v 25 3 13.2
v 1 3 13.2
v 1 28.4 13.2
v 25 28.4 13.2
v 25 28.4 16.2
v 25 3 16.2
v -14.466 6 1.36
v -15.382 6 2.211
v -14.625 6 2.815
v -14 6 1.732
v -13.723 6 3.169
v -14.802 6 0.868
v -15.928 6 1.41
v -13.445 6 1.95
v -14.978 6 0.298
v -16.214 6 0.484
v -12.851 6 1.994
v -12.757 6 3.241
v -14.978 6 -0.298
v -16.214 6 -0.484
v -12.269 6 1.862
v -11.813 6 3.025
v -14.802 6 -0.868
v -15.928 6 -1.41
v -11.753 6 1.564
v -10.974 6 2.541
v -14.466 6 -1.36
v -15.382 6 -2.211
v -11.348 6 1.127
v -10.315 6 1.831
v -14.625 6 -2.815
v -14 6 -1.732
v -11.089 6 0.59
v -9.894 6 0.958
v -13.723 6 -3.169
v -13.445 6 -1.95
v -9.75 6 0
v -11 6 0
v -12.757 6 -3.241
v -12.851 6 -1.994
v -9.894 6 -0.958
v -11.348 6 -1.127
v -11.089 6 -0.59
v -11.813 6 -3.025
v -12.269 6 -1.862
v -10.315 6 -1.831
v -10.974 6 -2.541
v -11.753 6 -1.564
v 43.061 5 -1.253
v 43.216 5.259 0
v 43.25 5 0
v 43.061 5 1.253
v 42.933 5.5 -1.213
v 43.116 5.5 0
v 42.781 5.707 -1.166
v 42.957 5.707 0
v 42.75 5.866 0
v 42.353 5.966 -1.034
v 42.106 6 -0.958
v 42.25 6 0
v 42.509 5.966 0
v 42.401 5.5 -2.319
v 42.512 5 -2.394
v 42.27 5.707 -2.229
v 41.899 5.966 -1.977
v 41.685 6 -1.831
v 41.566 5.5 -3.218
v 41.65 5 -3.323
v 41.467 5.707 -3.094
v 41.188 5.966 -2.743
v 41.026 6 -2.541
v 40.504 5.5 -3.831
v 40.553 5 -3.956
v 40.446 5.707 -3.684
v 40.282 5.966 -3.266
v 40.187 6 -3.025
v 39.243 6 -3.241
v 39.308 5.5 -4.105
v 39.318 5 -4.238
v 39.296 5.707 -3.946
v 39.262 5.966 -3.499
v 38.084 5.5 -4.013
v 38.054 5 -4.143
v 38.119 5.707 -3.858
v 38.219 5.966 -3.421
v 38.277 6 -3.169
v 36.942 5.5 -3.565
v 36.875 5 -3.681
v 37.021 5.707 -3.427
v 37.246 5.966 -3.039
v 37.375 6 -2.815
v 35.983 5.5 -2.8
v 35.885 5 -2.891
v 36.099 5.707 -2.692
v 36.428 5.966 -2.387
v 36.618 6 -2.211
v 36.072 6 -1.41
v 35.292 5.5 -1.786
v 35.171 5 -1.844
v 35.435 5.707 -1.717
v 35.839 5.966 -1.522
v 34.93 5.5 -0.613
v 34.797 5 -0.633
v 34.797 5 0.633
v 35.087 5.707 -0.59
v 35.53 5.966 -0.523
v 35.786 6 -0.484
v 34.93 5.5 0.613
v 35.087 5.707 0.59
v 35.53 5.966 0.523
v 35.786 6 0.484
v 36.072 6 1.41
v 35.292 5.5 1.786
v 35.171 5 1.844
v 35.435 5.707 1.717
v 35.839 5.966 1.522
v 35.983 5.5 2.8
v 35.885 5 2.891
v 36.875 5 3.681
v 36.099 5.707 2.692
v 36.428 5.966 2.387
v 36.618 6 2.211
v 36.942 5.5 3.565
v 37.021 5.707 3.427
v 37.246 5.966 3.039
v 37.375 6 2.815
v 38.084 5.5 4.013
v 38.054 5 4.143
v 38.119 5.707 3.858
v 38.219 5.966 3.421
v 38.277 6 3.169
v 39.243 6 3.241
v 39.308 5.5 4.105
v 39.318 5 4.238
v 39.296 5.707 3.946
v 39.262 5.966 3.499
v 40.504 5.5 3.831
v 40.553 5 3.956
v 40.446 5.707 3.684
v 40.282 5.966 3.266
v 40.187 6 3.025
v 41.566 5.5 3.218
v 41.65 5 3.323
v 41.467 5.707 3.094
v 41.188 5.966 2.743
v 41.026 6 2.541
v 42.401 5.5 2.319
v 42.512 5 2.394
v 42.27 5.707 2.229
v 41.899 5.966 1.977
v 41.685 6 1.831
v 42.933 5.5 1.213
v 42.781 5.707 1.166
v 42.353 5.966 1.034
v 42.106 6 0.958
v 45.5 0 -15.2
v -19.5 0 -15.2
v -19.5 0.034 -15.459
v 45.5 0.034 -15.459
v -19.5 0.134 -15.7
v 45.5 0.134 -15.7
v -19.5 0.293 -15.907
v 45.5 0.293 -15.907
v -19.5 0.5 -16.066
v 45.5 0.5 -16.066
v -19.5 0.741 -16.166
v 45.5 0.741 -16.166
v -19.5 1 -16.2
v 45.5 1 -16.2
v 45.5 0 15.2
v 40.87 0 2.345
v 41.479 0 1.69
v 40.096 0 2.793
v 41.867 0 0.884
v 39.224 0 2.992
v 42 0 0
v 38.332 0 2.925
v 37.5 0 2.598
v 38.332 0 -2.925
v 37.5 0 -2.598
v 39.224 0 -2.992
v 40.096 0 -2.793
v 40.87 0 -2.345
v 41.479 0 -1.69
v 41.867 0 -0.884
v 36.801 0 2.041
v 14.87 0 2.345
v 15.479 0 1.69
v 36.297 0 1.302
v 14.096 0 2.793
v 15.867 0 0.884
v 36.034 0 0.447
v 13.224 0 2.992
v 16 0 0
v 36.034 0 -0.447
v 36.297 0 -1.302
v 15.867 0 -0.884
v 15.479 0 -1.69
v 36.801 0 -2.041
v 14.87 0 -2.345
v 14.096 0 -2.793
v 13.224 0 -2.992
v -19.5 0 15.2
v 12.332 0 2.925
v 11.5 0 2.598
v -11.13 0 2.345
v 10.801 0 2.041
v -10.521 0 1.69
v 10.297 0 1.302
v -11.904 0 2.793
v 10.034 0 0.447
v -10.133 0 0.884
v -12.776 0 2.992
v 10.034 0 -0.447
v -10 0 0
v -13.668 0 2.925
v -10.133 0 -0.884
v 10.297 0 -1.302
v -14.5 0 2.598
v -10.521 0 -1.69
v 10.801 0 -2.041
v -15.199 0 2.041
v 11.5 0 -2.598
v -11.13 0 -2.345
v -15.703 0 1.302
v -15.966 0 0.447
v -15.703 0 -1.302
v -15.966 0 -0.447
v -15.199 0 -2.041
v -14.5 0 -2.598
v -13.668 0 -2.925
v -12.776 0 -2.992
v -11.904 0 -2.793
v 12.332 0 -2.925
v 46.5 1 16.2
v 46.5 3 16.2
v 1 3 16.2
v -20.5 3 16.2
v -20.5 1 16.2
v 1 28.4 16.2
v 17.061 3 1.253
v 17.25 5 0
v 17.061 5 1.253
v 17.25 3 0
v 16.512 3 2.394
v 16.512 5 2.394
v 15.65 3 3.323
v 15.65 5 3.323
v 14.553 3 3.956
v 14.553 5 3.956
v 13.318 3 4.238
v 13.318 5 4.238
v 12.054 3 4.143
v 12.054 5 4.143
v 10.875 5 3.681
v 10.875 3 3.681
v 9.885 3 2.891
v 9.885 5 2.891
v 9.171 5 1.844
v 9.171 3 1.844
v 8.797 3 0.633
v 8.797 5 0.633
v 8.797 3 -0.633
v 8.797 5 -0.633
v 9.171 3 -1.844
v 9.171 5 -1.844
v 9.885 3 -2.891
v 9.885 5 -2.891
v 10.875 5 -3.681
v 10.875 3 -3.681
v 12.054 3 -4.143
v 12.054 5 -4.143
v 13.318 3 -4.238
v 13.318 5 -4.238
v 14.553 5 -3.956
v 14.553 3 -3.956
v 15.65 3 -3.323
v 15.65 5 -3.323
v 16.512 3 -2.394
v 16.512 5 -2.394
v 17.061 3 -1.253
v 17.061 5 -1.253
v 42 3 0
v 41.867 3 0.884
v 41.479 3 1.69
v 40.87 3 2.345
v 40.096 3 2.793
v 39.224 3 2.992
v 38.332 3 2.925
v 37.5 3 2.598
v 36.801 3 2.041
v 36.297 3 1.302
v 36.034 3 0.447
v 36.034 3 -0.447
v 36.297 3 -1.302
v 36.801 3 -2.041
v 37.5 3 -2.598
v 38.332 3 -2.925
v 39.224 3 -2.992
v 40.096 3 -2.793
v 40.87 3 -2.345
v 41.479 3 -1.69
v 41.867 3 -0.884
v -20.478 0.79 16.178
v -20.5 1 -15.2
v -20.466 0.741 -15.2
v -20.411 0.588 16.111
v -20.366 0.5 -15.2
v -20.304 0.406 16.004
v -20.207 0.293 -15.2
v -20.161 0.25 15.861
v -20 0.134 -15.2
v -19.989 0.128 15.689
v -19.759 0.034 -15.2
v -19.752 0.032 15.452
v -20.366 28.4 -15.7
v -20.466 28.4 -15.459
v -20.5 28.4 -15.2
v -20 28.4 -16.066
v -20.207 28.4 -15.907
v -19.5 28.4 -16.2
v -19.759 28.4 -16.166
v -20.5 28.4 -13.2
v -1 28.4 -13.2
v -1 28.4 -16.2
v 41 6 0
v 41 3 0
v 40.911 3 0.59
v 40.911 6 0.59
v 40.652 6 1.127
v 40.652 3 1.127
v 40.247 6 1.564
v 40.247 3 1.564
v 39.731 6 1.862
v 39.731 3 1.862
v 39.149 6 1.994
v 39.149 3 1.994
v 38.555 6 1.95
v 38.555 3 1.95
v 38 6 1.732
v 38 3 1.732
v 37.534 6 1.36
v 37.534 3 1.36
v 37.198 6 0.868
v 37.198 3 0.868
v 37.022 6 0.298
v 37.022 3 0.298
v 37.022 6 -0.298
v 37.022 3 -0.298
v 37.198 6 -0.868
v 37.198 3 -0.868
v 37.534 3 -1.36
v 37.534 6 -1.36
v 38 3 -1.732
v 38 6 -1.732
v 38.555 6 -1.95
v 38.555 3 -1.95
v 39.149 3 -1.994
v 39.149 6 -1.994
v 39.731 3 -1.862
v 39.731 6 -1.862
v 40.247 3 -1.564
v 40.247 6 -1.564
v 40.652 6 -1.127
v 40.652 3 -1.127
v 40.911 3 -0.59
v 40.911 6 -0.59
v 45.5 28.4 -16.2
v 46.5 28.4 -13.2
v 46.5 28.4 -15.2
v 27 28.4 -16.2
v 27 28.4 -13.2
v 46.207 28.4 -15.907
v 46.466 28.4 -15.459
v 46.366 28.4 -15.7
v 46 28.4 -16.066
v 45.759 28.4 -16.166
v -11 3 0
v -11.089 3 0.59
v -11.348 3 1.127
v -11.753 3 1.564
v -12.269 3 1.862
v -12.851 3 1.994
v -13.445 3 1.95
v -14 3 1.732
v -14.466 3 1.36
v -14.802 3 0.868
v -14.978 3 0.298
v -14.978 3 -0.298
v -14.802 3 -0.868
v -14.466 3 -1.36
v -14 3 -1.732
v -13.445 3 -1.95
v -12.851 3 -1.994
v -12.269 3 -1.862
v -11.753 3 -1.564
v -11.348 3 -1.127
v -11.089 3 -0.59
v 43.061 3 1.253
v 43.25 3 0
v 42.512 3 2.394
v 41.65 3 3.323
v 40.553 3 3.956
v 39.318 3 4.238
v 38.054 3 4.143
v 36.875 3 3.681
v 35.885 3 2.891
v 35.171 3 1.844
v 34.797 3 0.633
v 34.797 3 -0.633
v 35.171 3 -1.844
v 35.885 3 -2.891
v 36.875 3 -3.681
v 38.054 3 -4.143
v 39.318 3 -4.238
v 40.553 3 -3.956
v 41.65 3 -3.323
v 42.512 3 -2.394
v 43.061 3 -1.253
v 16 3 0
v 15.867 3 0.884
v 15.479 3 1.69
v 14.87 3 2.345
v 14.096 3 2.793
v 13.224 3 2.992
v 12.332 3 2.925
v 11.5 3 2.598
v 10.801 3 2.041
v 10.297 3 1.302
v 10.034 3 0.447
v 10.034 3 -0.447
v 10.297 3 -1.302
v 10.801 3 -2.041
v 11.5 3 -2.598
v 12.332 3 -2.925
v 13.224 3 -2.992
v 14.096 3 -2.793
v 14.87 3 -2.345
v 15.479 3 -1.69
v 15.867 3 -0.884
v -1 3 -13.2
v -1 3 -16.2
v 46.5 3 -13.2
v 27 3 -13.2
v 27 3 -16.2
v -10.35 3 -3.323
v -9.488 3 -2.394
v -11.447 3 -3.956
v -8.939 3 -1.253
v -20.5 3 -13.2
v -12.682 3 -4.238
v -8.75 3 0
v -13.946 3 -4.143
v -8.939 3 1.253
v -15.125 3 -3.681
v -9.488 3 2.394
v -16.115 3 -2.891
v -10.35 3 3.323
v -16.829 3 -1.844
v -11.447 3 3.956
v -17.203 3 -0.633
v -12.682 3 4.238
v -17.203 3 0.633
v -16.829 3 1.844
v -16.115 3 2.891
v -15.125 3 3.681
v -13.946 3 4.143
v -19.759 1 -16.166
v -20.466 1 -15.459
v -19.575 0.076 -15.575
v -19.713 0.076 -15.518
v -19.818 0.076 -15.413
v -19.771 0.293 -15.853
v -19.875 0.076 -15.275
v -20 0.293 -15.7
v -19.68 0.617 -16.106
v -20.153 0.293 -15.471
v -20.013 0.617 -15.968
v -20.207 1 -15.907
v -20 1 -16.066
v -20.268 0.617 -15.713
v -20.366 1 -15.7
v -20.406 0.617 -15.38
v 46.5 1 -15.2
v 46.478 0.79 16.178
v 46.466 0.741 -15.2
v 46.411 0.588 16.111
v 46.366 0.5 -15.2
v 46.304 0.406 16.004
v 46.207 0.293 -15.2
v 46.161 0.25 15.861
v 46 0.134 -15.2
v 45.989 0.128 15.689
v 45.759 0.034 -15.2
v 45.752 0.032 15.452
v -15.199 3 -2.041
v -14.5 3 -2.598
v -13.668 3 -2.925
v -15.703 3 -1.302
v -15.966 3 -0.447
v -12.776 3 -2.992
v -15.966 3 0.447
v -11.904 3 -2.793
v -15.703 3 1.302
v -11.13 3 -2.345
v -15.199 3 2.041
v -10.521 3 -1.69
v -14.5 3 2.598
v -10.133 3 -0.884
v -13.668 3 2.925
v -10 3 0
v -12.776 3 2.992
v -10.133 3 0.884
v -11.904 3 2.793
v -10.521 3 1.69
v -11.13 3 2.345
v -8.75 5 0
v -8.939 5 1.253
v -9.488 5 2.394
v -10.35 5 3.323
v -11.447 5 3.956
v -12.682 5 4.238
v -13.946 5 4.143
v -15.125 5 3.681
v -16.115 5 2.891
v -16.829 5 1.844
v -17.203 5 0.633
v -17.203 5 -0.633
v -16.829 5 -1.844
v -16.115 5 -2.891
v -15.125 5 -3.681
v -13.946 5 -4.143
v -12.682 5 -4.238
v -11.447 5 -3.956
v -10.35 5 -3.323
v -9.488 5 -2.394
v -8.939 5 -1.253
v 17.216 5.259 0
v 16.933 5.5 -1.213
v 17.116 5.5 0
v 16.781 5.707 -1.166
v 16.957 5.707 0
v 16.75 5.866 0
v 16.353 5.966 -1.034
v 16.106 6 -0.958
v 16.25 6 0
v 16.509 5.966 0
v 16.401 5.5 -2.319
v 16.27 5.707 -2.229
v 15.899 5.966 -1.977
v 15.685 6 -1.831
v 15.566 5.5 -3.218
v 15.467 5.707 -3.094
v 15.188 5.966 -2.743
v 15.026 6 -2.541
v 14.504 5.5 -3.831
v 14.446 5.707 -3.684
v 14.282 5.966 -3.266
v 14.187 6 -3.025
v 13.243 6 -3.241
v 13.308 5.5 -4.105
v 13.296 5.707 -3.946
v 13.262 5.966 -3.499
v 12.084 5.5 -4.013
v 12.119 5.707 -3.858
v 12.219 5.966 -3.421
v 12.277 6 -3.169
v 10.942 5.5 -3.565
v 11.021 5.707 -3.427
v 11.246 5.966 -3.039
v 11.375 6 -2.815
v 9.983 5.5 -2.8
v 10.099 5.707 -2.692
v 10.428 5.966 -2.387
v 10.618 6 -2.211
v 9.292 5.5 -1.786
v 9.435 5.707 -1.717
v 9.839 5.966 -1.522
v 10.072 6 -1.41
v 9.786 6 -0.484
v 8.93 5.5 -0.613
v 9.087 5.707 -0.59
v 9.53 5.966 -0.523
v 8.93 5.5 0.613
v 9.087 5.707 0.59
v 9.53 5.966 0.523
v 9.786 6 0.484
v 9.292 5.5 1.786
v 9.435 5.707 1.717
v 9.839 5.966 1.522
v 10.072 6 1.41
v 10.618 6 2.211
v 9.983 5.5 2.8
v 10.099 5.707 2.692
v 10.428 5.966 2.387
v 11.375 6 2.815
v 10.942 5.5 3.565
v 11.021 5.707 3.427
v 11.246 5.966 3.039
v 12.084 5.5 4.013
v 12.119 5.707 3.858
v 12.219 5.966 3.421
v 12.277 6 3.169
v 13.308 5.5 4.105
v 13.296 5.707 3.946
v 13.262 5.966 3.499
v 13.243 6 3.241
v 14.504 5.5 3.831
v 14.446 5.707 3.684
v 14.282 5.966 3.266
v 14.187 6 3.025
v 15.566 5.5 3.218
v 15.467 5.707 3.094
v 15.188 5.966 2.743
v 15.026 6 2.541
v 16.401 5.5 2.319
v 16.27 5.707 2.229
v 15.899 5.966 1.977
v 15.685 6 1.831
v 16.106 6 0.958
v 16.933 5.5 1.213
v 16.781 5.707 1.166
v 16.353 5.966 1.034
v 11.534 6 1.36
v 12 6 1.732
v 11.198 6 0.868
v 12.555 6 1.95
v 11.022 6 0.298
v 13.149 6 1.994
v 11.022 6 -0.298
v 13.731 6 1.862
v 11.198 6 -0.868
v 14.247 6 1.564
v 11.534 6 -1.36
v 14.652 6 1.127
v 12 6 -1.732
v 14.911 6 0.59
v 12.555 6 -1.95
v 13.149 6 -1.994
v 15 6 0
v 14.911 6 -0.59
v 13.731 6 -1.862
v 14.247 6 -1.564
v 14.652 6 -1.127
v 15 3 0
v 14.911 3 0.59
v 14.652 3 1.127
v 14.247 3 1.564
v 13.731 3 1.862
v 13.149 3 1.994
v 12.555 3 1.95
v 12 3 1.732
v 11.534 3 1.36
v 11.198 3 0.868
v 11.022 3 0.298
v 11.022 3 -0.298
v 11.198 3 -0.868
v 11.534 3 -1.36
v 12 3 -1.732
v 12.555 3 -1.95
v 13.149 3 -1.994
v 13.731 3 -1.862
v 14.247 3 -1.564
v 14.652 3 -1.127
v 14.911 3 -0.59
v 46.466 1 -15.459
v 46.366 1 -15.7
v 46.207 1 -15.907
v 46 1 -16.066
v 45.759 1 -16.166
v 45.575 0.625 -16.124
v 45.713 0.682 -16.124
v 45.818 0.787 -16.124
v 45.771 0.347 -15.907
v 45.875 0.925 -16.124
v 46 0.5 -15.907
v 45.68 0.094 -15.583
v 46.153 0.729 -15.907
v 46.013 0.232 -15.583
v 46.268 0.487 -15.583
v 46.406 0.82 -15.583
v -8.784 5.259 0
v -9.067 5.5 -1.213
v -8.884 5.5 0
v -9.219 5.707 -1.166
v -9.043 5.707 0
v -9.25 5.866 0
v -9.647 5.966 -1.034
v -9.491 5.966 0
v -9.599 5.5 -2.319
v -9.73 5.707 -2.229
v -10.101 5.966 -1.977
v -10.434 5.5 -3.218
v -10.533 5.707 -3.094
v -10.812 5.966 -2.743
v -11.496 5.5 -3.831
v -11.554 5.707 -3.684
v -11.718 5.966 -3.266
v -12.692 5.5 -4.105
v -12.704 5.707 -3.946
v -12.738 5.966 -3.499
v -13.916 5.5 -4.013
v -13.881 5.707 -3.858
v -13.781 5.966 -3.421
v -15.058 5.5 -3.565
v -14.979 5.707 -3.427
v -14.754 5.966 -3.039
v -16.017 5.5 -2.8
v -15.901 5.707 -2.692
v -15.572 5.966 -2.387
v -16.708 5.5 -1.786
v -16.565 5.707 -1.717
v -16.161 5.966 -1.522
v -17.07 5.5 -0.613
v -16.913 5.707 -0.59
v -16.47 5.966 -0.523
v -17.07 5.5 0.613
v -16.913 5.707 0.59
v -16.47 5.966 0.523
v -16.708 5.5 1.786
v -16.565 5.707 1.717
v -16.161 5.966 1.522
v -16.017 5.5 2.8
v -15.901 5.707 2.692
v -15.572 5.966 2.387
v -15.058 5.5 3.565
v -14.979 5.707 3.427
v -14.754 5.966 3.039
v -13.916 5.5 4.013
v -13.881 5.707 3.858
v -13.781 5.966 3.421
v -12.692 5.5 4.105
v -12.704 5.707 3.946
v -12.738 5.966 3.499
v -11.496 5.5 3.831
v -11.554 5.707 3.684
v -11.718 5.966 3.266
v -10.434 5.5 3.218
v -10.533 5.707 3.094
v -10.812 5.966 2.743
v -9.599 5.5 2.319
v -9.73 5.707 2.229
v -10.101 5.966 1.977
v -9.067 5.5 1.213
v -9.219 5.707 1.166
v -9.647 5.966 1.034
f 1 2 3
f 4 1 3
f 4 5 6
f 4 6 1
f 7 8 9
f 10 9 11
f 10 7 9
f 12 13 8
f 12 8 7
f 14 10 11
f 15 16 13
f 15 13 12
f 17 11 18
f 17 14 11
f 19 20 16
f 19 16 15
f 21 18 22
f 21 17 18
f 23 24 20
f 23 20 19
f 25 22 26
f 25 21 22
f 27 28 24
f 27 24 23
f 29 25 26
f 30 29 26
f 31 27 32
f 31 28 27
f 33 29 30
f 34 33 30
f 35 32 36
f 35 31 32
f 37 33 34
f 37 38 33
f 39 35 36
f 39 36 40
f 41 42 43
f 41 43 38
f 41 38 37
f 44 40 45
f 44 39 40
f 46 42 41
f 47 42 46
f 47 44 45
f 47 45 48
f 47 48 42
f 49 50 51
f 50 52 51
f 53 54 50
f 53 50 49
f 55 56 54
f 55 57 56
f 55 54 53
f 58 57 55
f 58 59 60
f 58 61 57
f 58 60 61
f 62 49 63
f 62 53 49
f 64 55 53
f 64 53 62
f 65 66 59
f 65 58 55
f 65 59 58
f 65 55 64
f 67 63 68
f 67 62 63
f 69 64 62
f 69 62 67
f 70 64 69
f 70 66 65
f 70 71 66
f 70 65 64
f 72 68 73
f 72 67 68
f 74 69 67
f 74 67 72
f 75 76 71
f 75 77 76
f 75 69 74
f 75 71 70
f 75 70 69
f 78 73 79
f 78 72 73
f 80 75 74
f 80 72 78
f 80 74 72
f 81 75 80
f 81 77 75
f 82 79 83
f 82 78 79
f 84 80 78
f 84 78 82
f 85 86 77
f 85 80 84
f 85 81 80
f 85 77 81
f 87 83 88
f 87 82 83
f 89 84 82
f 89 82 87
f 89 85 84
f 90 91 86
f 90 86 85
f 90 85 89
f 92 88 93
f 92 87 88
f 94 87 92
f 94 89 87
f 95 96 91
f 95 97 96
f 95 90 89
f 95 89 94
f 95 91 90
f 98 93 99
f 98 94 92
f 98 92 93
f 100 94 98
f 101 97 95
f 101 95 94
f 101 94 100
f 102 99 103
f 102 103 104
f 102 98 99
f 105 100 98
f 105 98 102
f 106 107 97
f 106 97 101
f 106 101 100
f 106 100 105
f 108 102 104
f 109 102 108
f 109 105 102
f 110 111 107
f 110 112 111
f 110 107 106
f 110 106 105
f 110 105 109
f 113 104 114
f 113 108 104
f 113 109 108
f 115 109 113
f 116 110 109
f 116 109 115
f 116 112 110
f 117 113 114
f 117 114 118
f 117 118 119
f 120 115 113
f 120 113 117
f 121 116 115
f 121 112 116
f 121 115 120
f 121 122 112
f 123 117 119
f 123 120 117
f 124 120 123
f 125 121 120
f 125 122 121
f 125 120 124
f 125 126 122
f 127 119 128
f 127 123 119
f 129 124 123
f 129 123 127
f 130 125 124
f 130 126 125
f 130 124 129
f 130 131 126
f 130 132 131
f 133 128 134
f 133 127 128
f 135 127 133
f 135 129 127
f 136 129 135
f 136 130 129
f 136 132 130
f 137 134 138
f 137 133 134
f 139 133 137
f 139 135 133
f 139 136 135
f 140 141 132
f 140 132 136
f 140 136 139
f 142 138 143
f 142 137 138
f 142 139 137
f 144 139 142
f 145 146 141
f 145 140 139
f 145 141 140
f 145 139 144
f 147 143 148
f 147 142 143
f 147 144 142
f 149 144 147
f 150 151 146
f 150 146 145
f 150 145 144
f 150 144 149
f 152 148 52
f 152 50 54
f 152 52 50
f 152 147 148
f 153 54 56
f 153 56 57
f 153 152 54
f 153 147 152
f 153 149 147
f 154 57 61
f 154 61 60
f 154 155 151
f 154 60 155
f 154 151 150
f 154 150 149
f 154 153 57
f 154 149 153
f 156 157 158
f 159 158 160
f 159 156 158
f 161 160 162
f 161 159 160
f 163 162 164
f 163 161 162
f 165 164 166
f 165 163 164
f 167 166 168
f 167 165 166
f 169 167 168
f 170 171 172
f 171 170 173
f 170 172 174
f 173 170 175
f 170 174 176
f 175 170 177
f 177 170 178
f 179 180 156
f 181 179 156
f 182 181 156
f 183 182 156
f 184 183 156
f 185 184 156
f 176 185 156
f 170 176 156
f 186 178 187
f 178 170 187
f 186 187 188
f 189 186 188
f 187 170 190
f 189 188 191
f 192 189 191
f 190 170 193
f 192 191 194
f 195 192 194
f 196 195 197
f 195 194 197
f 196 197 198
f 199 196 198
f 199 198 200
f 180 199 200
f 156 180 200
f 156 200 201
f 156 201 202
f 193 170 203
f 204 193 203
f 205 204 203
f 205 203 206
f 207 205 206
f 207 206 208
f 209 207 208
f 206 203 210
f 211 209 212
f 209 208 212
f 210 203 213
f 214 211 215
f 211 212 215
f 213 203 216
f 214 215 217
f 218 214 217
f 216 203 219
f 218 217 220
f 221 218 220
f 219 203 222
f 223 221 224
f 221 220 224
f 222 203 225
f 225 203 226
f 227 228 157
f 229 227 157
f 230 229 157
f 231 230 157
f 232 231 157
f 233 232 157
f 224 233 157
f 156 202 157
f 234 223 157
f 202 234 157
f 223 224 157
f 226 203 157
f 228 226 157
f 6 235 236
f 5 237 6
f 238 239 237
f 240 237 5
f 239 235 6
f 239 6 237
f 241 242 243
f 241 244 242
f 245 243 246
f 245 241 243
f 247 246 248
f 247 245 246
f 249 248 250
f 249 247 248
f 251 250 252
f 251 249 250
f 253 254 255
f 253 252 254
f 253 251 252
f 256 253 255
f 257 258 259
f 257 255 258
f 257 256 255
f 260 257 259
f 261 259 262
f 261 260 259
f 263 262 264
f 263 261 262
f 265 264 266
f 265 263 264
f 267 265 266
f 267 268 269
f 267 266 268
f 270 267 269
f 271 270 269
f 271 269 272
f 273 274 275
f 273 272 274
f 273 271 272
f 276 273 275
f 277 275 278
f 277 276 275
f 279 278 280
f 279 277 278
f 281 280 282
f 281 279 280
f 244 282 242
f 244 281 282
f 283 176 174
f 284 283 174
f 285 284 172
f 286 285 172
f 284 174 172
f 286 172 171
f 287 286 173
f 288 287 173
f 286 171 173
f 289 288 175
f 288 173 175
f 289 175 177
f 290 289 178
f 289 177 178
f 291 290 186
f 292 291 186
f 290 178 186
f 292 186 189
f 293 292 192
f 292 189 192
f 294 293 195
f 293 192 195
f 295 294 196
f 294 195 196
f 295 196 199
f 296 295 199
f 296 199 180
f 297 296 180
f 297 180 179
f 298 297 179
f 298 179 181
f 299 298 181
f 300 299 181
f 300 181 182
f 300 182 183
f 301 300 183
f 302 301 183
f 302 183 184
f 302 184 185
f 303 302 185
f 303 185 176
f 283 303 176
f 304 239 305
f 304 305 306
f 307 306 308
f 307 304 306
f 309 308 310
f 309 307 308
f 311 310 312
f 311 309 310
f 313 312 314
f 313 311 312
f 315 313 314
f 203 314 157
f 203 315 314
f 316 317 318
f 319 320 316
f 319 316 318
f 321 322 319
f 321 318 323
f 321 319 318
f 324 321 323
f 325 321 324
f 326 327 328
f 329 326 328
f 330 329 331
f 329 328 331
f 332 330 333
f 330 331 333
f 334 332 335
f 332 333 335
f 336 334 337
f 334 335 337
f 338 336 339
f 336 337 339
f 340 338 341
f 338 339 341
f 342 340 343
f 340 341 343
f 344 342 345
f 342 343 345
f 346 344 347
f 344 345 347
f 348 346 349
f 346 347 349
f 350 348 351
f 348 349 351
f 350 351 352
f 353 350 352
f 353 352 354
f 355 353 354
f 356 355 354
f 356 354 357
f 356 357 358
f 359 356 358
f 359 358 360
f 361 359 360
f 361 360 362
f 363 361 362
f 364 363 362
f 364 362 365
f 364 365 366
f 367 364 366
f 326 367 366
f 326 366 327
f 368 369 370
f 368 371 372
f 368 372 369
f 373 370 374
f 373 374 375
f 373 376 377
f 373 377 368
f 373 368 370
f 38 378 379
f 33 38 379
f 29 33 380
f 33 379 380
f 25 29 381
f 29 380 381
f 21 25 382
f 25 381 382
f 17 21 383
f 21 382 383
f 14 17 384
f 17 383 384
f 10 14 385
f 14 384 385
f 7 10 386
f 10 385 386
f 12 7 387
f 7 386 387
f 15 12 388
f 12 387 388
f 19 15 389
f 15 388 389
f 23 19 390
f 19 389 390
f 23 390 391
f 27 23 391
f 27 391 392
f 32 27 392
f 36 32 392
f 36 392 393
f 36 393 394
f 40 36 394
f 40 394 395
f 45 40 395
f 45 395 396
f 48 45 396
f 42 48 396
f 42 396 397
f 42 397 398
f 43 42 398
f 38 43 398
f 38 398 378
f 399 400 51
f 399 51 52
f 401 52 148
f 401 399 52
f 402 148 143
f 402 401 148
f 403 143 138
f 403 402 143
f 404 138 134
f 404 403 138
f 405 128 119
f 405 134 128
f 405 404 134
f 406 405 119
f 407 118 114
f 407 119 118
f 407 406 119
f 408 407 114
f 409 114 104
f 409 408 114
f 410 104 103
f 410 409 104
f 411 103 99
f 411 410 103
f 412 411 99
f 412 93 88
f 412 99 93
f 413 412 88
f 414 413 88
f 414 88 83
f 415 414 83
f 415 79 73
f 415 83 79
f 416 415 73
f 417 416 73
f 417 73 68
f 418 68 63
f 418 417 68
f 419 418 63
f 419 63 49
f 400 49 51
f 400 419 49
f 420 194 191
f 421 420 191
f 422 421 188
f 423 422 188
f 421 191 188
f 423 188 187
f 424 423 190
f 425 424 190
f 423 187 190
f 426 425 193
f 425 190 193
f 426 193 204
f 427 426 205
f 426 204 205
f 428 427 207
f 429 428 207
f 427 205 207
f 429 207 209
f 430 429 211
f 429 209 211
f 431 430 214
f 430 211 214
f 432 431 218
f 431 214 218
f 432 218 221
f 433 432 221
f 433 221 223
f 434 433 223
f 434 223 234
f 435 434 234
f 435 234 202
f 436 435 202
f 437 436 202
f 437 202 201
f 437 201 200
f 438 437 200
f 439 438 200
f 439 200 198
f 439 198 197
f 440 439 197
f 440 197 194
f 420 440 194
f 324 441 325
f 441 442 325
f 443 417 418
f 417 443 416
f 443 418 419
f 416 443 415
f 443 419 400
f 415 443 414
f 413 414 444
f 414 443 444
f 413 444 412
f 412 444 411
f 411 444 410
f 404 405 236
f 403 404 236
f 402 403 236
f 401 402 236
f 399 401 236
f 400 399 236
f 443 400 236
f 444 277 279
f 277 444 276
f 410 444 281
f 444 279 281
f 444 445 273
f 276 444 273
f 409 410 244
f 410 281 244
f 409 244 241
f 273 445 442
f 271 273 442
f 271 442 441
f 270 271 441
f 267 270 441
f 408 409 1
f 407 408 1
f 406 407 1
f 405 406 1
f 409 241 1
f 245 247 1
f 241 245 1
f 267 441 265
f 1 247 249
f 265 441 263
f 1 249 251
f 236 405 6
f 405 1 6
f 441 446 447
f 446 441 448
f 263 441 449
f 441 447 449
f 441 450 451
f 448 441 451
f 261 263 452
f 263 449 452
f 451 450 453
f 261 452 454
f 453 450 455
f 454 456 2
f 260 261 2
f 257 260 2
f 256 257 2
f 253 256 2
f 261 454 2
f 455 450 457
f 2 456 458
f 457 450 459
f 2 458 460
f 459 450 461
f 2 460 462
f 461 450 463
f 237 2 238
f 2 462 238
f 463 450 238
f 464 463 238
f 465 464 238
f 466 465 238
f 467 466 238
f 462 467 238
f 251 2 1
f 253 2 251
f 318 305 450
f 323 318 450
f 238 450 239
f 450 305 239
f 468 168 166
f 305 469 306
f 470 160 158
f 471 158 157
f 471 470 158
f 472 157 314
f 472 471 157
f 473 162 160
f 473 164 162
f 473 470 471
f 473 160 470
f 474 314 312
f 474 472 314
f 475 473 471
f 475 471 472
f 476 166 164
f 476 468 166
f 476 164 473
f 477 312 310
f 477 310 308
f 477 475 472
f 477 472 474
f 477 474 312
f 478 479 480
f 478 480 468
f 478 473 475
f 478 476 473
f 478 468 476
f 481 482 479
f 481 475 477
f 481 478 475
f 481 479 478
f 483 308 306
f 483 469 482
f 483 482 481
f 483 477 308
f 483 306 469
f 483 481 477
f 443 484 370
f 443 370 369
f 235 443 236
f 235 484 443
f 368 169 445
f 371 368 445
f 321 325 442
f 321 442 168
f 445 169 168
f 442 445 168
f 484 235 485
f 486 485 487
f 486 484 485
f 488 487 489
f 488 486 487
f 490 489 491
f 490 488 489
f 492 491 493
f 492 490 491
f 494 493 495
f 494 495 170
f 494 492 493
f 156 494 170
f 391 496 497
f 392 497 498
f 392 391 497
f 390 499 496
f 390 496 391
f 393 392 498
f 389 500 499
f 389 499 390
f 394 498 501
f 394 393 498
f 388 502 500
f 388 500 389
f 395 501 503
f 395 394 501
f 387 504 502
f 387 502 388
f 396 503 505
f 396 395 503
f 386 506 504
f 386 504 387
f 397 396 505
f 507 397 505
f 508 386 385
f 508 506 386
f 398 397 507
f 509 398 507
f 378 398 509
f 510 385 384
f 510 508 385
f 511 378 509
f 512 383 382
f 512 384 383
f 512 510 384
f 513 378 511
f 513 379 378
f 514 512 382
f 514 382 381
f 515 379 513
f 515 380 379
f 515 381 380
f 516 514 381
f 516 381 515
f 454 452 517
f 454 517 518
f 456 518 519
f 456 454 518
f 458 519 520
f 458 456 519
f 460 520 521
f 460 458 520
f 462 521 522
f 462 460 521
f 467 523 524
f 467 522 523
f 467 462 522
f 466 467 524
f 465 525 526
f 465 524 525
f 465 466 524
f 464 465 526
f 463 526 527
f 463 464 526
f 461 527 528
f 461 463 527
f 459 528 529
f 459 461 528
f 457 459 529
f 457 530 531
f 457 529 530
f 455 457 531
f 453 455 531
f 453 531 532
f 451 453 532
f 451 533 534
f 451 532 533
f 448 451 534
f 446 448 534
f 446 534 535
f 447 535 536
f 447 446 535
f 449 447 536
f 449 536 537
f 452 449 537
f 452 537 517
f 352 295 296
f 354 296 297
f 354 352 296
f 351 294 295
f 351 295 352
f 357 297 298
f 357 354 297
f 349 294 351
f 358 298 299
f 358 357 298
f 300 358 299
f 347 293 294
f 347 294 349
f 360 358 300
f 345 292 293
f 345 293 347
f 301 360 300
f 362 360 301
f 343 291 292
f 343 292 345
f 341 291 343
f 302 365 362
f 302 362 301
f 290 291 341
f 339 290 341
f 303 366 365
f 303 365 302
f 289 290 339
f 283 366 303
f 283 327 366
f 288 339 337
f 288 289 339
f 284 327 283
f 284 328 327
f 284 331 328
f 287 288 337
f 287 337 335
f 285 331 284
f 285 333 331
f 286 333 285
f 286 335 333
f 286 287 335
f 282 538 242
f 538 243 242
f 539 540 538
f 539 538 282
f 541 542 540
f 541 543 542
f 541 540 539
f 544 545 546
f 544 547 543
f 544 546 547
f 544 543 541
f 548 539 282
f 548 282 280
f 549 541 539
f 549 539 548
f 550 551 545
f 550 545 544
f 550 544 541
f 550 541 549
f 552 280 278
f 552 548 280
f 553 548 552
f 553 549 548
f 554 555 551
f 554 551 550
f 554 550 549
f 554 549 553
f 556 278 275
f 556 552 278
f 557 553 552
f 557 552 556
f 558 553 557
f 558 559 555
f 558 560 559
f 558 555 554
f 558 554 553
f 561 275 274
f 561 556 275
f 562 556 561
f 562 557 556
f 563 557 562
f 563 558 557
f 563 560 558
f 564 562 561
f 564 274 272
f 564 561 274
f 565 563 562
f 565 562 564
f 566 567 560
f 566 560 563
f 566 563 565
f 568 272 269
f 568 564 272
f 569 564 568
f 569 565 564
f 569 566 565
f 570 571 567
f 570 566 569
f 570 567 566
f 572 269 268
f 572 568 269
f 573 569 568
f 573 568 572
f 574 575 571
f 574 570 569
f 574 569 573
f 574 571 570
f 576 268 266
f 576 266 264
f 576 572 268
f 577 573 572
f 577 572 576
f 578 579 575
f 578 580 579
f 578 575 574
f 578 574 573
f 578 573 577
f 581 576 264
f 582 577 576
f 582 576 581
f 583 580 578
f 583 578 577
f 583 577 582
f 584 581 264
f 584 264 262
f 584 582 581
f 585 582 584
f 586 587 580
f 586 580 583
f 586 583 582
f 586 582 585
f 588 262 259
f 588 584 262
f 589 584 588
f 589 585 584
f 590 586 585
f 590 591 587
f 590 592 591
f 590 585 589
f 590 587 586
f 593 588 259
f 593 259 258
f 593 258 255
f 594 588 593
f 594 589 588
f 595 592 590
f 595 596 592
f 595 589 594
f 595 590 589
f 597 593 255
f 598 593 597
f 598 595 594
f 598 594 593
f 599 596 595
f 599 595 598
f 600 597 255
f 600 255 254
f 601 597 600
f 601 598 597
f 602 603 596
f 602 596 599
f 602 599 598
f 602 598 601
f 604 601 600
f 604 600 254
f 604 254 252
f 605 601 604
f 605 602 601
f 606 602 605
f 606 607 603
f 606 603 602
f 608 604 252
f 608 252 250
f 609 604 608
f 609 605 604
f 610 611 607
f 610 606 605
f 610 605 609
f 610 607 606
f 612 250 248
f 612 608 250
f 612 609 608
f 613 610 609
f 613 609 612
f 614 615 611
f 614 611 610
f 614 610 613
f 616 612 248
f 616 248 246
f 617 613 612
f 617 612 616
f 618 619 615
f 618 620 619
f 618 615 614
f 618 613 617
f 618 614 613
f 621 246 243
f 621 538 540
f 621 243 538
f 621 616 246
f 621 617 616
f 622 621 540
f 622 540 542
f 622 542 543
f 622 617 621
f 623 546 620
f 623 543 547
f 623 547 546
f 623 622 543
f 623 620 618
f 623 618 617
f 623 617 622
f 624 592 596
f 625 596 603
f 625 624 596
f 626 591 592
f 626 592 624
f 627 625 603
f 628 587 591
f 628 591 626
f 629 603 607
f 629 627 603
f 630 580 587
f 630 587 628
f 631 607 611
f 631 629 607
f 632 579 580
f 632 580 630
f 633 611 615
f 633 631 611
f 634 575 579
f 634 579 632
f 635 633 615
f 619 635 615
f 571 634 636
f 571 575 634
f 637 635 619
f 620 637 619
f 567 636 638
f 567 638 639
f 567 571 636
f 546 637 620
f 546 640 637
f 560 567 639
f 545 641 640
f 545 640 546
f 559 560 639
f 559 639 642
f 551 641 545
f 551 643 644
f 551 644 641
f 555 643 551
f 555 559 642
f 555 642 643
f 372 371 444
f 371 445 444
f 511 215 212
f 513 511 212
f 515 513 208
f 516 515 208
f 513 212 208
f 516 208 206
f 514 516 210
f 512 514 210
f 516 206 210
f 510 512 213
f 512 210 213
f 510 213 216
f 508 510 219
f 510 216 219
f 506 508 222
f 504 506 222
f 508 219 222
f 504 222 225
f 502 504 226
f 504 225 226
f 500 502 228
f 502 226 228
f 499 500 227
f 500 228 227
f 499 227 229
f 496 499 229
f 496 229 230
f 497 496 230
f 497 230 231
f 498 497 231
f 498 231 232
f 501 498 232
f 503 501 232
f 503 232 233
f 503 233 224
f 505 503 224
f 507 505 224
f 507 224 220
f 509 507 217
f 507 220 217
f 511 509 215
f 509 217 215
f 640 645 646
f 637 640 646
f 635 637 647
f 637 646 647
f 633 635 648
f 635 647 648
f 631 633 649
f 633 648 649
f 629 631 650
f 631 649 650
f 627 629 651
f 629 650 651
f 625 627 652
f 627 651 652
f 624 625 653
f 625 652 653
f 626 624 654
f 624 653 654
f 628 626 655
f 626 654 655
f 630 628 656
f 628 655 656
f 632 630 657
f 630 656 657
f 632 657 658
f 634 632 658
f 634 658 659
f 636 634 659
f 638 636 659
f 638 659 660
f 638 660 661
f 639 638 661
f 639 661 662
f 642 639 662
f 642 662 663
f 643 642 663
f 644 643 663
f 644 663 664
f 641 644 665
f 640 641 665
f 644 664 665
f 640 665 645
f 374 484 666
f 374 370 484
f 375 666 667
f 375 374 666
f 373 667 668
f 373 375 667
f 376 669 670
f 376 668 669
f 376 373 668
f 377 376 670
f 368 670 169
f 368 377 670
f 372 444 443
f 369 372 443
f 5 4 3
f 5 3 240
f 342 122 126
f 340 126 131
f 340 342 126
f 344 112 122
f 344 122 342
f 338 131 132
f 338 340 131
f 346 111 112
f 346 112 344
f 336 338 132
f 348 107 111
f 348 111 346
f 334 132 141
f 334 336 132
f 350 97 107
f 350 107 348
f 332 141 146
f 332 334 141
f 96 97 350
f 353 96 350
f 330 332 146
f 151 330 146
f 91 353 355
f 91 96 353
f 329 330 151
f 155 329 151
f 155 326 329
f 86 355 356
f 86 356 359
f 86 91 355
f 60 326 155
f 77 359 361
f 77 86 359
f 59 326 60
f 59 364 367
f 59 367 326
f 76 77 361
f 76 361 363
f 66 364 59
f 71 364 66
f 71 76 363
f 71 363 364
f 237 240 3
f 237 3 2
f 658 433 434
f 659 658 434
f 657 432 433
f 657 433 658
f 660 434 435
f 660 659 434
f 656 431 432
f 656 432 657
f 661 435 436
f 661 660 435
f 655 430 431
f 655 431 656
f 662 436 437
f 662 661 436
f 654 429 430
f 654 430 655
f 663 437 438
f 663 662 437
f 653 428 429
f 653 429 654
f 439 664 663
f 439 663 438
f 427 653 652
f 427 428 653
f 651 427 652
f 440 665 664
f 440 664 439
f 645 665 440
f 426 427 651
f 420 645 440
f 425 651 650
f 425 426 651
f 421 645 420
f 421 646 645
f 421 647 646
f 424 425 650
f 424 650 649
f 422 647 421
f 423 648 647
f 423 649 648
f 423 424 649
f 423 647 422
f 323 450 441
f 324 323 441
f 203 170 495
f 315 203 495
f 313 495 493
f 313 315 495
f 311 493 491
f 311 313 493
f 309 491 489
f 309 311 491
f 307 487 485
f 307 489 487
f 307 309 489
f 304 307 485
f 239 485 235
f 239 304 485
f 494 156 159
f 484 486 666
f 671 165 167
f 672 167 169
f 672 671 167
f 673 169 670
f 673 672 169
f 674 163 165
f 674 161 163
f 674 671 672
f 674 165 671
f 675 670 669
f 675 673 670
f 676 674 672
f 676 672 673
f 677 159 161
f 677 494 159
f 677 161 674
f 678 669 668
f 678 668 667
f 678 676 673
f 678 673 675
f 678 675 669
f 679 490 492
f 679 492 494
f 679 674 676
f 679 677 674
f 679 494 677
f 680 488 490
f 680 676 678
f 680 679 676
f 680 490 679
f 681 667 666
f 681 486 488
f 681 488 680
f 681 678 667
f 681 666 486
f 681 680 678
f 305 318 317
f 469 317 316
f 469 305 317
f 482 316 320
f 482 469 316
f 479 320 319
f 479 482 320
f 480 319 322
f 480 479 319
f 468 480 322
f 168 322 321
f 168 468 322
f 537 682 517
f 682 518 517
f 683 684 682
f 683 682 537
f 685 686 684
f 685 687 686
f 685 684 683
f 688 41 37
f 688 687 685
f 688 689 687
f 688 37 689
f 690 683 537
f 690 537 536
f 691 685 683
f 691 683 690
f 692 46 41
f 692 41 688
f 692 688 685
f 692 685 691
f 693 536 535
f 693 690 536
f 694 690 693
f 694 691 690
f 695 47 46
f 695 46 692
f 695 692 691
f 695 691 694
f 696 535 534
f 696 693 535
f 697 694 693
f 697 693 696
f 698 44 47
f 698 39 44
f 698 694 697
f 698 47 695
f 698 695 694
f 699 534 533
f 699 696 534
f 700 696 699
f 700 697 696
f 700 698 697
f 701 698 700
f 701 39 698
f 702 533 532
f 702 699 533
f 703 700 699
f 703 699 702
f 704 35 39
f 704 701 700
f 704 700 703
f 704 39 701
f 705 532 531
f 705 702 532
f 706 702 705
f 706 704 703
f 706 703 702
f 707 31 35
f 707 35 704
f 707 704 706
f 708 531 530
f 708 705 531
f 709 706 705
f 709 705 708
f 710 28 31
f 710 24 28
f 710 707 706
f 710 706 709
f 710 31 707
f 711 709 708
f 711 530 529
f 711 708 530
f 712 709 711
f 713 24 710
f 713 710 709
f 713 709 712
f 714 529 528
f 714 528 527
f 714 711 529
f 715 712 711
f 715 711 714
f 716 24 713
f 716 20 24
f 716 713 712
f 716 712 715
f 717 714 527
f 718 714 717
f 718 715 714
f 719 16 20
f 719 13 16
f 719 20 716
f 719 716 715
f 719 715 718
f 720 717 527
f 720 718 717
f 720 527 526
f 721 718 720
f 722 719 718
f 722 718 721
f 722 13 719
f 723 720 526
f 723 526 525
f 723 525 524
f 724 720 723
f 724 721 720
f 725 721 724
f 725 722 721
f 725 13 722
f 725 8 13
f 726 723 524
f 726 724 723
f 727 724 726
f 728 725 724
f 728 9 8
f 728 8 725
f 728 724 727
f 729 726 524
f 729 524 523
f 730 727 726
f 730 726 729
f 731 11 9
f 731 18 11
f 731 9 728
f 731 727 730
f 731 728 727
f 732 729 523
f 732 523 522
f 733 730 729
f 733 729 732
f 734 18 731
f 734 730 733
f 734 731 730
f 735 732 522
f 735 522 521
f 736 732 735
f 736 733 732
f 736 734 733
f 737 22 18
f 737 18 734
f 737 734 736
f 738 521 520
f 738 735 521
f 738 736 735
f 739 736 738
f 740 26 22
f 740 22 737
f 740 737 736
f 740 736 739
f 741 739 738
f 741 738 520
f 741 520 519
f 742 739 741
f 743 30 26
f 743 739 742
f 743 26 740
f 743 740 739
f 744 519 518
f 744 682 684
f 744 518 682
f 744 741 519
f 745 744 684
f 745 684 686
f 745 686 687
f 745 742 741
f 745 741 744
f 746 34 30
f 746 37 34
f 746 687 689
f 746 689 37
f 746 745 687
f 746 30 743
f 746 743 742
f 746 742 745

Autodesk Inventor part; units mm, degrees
ref_plane "YZ Plane" through (0, 0, 0) normal (1, 0, 0) x (0, 1, 0)
ref_plane "XZ Plane" through (0, 0, 0) normal (0, 1, 0) x (-1, 0, 0)
ref_plane "XY Plane" through (0, 0, 0) normal (0, 0, 1) x (1, 0, 0)
sketch "Sketch1" plane through (0, 0, 0) normal (0, 1, 0) x (-1, 0, 0)
  line L0 (20.5, 16.2) -> (-20.5, 16.2)
  line L1 (-20.5, 16.2) -> (-20.5, -16.2)
  line L2 (-20.5, -16.2) -> (20.5, -16.2)
  line L3 (20.5, -16.2) -> (20.5, 16.2)
  point P0 (0, 0)
  dimension "d0" = 41
  dimension "d1" = 32.4
extrude "Extrusion1" add sketch "Sketch1" along normal blind 3
sketch "Sketch3" plane through (0, 3, 0) normal (0, 1, 0) x (1, 0, 0)
  line L0 (-20.5, -16.2) -> (20.5, -16.2) projected
  line L1 (-20.5, 16.2) -> (-20.5, -16.2) projected
  line L2 (20.5, -16.2) -> (-20.5, -16.2)
  line L3 (-20.5, -16.2) -> (-20.5, -13.2)
  line L4 (-20.5, -13.2) -> (20.5, -13.2)
  line L5 (20.5, -13.2) -> (20.5, -16.2)
  line L6 (20.5, 16.2) -> (-20.5, 16.2) projected
  line L7 (20.5, 16.2) -> (-20.5, 16.2)
  line L8 (-20.5, 16.2) -> (-20.5, 13.2)
  line L9 (-20.5, 13.2) -> (20.5, 13.2)
  line L10 (20.5, 13.2) -> (20.5, 16.2)
  point P0 (0, 0)
  dimension "d8" = 3
  dimension "d9" = 3
extrude "Extrusion3" add sketch "Sketch3" along normal blind 25.4
sketch "Sketch4" plane through (20.5, 0, -16.2) normal (0, 0, -1) x (-1, 0, 0)
  line L0 (41, 3) -> (0, 3) projected
  line L1 (0, 28.4) -> (41, 28.4) projected
  line L2 (0, 3) -> (21.5, 3)
  line L3 (21.5, 3) -> (21.5, 28.4)
  line L4 (21.5, 28.4) -> (0, 28.4)
  line L5 (0, 28.4) -> (0, 3)
  point P0 (20.5, 0)
  dimension "d12" = 21.5
extrude "Extrusion4" cut sketch "Sketch4" against normal blind 3
sketch "Sketch5" plane through (-20.5, 0, 16.2) normal (0, 0, 1) x (1, 0, 0)
  line L0 (41, 28.4) -> (0, 28.4) projected
  line L1 (19.5, 3) -> (41, 3) projected
  line L2 (0, 28.4) -> (21.5, 28.4)
  line L3 (21.5, 28.4) -> (21.5, 3)
  line L4 (21.5, 3) -> (0, 3)
  line L5 (0, 3) -> (0, 28.4)
  point P0 (20.5, 0)
  dimension "d15" = 21.5
extrude "Extrusion5" cut sketch "Sketch5" against normal blind 3
sketch "Sketch6" plane through (0, 3, 0) normal (0, 1, 0) x (1, 0, 0)
  circle A0 centre (13, 0) radius 4.25
  circle A1 centre (-13, 0) radius 4.25
  line L0 (-20.5, 13.2) -> (-20.5, -16.2) projected
  line L1 (20.5, -13.2) -> (20.5, 16.2) projected
  point P0 (0, 0)
  dimension "d20" = 8.5
  dimension "d21" = 8.5
  dimension "d32" = 26
  dimension "d33" = 7.5
  dimension "d34" = 7.5
extrude "Extrusion6" add sketch "Sketch6" along normal blind 3
sketch "Sketch9" plane through (20.5, 0, 16.2) normal (1, 0, 0) x (0, 0, -1)
  line L0 (32.4, 0) -> (32.4, 3) projected
  line L1 (32.4, 3) -> (0, 3)
  line L2 (0, 3) -> (0, 0)
  line L3 (0, 0) -> (32.4, 0)
  line L4 (32.4, 0) -> (32.4, 3)
  point P0 (16.2, 0)
extrude "Extrusion9" add sketch "Sketch9" along normal blind 26
sketch "Sketch10" plane through (0, 3, 0) normal (0, 1, 0) x (1, 0, 0)
  circle A0 centre (39, 0) radius 4.25
  point P0 (0, 0)
  dimension "d37" = 8.5
extrude "Extrusion10" add sketch "Sketch10" along normal blind 3
sketch "Sketch11" plane through (0, 3, 0) normal (0, 1, 0) x (1, 0, 0)
  line L0 (46.5, 16.2) -> (46.5, -16.2) projected
  line L1 (46.5, 16.2) -> (27, 16.2)
  line L2 (27, 16.2) -> (27, 13.2)
  line L3 (27, 13.2) -> (46.5, 13.2)
  line L4 (46.5, 13.2) -> (46.5, 16.2)
  point P0 (0, 0)
  dimension "d40" = 19.5
  dimension "d41" = 3
extrude "Extrusion11" add sketch "Sketch11" along normal blind 25.4
sketch "Sketch14" plane through (20.5, 3, 13.2) normal (1, 0, 0) x (0, 0, -1)
  line L0 (0, 0) -> (0, 25.4) projected
  line L1 (-3, 0) -> (-3, 25.4) projected
  line L2 (0, 25.4) -> (-3, 25.4)
  line L3 (-3, 25.4) -> (-3, 0)
  line L4 (-3, 0) -> (0, 0)
  line L5 (0, 0) -> (0, 25.4)
  point P0 (13.2, -3)
extrude "Extrusion14" add sketch "Sketch14" along normal blind 4.5
fillet "Fillet1" radius 1 3 edges at (-17.25, 6, 0) (8.75, 6, 0) (34.75, 6, 0)
fillet "Fillet2" radius 1 6 edges at (-20.5, 14.2, -16.2) (-20.5, 0, 0) (13, 0, 16.2) (46.5, 0, 0) (46.5, 14.2, -16.2) (13, 0, -16.2)
sketch "Sketch15" plane through (0, 0, 0) normal (0, -1, 0) x (1, 0, 0)
  circle A0 centre (39, 0) radius 4.25 projected
  circle A1 centre (39, 0) radius 2
  circle A2 centre (13, 0) radius 3.25 projected
  circle A3 centre (13, 0) radius 2
  circle A4 centre (-13, 0) radius 3.25 projected
  circle A5 centre (-13, 0) radius 2
  point P0 (0, 0)
  dimension "d54" = 4
  dimension "d55" = 4
  dimension "d56" = 4
extrude "Extrusion15" cut sketch "Sketch15" against normal blind 10 contours A1 | A3 | A5
sketch "Sketch16" plane through (0, 0, 0) normal (0, -1, 0) x (1, 0, 0)
  circle A0 centre (39, 0) radius 2 projected
  circle A1 centre (39, 0) radius 3
  circle A2 centre (13, 0) radius 2 projected
  circle A3 centre (13, 0) radius 3
  circle A4 centre (-13, 0) radius 2 projected
  circle A5 centre (-13, 0) radius 3
  point P0 (0, 0)
  dimension "d59" = 6
  dimension "d60" = 6
  dimension "d61" = 6
extrude "Extrusion16" cut sketch "Sketch16" against normal blind 3 contours A0 | A1 | A2 | A3 | A4 | A5
properties part number "railBracketBottom"
